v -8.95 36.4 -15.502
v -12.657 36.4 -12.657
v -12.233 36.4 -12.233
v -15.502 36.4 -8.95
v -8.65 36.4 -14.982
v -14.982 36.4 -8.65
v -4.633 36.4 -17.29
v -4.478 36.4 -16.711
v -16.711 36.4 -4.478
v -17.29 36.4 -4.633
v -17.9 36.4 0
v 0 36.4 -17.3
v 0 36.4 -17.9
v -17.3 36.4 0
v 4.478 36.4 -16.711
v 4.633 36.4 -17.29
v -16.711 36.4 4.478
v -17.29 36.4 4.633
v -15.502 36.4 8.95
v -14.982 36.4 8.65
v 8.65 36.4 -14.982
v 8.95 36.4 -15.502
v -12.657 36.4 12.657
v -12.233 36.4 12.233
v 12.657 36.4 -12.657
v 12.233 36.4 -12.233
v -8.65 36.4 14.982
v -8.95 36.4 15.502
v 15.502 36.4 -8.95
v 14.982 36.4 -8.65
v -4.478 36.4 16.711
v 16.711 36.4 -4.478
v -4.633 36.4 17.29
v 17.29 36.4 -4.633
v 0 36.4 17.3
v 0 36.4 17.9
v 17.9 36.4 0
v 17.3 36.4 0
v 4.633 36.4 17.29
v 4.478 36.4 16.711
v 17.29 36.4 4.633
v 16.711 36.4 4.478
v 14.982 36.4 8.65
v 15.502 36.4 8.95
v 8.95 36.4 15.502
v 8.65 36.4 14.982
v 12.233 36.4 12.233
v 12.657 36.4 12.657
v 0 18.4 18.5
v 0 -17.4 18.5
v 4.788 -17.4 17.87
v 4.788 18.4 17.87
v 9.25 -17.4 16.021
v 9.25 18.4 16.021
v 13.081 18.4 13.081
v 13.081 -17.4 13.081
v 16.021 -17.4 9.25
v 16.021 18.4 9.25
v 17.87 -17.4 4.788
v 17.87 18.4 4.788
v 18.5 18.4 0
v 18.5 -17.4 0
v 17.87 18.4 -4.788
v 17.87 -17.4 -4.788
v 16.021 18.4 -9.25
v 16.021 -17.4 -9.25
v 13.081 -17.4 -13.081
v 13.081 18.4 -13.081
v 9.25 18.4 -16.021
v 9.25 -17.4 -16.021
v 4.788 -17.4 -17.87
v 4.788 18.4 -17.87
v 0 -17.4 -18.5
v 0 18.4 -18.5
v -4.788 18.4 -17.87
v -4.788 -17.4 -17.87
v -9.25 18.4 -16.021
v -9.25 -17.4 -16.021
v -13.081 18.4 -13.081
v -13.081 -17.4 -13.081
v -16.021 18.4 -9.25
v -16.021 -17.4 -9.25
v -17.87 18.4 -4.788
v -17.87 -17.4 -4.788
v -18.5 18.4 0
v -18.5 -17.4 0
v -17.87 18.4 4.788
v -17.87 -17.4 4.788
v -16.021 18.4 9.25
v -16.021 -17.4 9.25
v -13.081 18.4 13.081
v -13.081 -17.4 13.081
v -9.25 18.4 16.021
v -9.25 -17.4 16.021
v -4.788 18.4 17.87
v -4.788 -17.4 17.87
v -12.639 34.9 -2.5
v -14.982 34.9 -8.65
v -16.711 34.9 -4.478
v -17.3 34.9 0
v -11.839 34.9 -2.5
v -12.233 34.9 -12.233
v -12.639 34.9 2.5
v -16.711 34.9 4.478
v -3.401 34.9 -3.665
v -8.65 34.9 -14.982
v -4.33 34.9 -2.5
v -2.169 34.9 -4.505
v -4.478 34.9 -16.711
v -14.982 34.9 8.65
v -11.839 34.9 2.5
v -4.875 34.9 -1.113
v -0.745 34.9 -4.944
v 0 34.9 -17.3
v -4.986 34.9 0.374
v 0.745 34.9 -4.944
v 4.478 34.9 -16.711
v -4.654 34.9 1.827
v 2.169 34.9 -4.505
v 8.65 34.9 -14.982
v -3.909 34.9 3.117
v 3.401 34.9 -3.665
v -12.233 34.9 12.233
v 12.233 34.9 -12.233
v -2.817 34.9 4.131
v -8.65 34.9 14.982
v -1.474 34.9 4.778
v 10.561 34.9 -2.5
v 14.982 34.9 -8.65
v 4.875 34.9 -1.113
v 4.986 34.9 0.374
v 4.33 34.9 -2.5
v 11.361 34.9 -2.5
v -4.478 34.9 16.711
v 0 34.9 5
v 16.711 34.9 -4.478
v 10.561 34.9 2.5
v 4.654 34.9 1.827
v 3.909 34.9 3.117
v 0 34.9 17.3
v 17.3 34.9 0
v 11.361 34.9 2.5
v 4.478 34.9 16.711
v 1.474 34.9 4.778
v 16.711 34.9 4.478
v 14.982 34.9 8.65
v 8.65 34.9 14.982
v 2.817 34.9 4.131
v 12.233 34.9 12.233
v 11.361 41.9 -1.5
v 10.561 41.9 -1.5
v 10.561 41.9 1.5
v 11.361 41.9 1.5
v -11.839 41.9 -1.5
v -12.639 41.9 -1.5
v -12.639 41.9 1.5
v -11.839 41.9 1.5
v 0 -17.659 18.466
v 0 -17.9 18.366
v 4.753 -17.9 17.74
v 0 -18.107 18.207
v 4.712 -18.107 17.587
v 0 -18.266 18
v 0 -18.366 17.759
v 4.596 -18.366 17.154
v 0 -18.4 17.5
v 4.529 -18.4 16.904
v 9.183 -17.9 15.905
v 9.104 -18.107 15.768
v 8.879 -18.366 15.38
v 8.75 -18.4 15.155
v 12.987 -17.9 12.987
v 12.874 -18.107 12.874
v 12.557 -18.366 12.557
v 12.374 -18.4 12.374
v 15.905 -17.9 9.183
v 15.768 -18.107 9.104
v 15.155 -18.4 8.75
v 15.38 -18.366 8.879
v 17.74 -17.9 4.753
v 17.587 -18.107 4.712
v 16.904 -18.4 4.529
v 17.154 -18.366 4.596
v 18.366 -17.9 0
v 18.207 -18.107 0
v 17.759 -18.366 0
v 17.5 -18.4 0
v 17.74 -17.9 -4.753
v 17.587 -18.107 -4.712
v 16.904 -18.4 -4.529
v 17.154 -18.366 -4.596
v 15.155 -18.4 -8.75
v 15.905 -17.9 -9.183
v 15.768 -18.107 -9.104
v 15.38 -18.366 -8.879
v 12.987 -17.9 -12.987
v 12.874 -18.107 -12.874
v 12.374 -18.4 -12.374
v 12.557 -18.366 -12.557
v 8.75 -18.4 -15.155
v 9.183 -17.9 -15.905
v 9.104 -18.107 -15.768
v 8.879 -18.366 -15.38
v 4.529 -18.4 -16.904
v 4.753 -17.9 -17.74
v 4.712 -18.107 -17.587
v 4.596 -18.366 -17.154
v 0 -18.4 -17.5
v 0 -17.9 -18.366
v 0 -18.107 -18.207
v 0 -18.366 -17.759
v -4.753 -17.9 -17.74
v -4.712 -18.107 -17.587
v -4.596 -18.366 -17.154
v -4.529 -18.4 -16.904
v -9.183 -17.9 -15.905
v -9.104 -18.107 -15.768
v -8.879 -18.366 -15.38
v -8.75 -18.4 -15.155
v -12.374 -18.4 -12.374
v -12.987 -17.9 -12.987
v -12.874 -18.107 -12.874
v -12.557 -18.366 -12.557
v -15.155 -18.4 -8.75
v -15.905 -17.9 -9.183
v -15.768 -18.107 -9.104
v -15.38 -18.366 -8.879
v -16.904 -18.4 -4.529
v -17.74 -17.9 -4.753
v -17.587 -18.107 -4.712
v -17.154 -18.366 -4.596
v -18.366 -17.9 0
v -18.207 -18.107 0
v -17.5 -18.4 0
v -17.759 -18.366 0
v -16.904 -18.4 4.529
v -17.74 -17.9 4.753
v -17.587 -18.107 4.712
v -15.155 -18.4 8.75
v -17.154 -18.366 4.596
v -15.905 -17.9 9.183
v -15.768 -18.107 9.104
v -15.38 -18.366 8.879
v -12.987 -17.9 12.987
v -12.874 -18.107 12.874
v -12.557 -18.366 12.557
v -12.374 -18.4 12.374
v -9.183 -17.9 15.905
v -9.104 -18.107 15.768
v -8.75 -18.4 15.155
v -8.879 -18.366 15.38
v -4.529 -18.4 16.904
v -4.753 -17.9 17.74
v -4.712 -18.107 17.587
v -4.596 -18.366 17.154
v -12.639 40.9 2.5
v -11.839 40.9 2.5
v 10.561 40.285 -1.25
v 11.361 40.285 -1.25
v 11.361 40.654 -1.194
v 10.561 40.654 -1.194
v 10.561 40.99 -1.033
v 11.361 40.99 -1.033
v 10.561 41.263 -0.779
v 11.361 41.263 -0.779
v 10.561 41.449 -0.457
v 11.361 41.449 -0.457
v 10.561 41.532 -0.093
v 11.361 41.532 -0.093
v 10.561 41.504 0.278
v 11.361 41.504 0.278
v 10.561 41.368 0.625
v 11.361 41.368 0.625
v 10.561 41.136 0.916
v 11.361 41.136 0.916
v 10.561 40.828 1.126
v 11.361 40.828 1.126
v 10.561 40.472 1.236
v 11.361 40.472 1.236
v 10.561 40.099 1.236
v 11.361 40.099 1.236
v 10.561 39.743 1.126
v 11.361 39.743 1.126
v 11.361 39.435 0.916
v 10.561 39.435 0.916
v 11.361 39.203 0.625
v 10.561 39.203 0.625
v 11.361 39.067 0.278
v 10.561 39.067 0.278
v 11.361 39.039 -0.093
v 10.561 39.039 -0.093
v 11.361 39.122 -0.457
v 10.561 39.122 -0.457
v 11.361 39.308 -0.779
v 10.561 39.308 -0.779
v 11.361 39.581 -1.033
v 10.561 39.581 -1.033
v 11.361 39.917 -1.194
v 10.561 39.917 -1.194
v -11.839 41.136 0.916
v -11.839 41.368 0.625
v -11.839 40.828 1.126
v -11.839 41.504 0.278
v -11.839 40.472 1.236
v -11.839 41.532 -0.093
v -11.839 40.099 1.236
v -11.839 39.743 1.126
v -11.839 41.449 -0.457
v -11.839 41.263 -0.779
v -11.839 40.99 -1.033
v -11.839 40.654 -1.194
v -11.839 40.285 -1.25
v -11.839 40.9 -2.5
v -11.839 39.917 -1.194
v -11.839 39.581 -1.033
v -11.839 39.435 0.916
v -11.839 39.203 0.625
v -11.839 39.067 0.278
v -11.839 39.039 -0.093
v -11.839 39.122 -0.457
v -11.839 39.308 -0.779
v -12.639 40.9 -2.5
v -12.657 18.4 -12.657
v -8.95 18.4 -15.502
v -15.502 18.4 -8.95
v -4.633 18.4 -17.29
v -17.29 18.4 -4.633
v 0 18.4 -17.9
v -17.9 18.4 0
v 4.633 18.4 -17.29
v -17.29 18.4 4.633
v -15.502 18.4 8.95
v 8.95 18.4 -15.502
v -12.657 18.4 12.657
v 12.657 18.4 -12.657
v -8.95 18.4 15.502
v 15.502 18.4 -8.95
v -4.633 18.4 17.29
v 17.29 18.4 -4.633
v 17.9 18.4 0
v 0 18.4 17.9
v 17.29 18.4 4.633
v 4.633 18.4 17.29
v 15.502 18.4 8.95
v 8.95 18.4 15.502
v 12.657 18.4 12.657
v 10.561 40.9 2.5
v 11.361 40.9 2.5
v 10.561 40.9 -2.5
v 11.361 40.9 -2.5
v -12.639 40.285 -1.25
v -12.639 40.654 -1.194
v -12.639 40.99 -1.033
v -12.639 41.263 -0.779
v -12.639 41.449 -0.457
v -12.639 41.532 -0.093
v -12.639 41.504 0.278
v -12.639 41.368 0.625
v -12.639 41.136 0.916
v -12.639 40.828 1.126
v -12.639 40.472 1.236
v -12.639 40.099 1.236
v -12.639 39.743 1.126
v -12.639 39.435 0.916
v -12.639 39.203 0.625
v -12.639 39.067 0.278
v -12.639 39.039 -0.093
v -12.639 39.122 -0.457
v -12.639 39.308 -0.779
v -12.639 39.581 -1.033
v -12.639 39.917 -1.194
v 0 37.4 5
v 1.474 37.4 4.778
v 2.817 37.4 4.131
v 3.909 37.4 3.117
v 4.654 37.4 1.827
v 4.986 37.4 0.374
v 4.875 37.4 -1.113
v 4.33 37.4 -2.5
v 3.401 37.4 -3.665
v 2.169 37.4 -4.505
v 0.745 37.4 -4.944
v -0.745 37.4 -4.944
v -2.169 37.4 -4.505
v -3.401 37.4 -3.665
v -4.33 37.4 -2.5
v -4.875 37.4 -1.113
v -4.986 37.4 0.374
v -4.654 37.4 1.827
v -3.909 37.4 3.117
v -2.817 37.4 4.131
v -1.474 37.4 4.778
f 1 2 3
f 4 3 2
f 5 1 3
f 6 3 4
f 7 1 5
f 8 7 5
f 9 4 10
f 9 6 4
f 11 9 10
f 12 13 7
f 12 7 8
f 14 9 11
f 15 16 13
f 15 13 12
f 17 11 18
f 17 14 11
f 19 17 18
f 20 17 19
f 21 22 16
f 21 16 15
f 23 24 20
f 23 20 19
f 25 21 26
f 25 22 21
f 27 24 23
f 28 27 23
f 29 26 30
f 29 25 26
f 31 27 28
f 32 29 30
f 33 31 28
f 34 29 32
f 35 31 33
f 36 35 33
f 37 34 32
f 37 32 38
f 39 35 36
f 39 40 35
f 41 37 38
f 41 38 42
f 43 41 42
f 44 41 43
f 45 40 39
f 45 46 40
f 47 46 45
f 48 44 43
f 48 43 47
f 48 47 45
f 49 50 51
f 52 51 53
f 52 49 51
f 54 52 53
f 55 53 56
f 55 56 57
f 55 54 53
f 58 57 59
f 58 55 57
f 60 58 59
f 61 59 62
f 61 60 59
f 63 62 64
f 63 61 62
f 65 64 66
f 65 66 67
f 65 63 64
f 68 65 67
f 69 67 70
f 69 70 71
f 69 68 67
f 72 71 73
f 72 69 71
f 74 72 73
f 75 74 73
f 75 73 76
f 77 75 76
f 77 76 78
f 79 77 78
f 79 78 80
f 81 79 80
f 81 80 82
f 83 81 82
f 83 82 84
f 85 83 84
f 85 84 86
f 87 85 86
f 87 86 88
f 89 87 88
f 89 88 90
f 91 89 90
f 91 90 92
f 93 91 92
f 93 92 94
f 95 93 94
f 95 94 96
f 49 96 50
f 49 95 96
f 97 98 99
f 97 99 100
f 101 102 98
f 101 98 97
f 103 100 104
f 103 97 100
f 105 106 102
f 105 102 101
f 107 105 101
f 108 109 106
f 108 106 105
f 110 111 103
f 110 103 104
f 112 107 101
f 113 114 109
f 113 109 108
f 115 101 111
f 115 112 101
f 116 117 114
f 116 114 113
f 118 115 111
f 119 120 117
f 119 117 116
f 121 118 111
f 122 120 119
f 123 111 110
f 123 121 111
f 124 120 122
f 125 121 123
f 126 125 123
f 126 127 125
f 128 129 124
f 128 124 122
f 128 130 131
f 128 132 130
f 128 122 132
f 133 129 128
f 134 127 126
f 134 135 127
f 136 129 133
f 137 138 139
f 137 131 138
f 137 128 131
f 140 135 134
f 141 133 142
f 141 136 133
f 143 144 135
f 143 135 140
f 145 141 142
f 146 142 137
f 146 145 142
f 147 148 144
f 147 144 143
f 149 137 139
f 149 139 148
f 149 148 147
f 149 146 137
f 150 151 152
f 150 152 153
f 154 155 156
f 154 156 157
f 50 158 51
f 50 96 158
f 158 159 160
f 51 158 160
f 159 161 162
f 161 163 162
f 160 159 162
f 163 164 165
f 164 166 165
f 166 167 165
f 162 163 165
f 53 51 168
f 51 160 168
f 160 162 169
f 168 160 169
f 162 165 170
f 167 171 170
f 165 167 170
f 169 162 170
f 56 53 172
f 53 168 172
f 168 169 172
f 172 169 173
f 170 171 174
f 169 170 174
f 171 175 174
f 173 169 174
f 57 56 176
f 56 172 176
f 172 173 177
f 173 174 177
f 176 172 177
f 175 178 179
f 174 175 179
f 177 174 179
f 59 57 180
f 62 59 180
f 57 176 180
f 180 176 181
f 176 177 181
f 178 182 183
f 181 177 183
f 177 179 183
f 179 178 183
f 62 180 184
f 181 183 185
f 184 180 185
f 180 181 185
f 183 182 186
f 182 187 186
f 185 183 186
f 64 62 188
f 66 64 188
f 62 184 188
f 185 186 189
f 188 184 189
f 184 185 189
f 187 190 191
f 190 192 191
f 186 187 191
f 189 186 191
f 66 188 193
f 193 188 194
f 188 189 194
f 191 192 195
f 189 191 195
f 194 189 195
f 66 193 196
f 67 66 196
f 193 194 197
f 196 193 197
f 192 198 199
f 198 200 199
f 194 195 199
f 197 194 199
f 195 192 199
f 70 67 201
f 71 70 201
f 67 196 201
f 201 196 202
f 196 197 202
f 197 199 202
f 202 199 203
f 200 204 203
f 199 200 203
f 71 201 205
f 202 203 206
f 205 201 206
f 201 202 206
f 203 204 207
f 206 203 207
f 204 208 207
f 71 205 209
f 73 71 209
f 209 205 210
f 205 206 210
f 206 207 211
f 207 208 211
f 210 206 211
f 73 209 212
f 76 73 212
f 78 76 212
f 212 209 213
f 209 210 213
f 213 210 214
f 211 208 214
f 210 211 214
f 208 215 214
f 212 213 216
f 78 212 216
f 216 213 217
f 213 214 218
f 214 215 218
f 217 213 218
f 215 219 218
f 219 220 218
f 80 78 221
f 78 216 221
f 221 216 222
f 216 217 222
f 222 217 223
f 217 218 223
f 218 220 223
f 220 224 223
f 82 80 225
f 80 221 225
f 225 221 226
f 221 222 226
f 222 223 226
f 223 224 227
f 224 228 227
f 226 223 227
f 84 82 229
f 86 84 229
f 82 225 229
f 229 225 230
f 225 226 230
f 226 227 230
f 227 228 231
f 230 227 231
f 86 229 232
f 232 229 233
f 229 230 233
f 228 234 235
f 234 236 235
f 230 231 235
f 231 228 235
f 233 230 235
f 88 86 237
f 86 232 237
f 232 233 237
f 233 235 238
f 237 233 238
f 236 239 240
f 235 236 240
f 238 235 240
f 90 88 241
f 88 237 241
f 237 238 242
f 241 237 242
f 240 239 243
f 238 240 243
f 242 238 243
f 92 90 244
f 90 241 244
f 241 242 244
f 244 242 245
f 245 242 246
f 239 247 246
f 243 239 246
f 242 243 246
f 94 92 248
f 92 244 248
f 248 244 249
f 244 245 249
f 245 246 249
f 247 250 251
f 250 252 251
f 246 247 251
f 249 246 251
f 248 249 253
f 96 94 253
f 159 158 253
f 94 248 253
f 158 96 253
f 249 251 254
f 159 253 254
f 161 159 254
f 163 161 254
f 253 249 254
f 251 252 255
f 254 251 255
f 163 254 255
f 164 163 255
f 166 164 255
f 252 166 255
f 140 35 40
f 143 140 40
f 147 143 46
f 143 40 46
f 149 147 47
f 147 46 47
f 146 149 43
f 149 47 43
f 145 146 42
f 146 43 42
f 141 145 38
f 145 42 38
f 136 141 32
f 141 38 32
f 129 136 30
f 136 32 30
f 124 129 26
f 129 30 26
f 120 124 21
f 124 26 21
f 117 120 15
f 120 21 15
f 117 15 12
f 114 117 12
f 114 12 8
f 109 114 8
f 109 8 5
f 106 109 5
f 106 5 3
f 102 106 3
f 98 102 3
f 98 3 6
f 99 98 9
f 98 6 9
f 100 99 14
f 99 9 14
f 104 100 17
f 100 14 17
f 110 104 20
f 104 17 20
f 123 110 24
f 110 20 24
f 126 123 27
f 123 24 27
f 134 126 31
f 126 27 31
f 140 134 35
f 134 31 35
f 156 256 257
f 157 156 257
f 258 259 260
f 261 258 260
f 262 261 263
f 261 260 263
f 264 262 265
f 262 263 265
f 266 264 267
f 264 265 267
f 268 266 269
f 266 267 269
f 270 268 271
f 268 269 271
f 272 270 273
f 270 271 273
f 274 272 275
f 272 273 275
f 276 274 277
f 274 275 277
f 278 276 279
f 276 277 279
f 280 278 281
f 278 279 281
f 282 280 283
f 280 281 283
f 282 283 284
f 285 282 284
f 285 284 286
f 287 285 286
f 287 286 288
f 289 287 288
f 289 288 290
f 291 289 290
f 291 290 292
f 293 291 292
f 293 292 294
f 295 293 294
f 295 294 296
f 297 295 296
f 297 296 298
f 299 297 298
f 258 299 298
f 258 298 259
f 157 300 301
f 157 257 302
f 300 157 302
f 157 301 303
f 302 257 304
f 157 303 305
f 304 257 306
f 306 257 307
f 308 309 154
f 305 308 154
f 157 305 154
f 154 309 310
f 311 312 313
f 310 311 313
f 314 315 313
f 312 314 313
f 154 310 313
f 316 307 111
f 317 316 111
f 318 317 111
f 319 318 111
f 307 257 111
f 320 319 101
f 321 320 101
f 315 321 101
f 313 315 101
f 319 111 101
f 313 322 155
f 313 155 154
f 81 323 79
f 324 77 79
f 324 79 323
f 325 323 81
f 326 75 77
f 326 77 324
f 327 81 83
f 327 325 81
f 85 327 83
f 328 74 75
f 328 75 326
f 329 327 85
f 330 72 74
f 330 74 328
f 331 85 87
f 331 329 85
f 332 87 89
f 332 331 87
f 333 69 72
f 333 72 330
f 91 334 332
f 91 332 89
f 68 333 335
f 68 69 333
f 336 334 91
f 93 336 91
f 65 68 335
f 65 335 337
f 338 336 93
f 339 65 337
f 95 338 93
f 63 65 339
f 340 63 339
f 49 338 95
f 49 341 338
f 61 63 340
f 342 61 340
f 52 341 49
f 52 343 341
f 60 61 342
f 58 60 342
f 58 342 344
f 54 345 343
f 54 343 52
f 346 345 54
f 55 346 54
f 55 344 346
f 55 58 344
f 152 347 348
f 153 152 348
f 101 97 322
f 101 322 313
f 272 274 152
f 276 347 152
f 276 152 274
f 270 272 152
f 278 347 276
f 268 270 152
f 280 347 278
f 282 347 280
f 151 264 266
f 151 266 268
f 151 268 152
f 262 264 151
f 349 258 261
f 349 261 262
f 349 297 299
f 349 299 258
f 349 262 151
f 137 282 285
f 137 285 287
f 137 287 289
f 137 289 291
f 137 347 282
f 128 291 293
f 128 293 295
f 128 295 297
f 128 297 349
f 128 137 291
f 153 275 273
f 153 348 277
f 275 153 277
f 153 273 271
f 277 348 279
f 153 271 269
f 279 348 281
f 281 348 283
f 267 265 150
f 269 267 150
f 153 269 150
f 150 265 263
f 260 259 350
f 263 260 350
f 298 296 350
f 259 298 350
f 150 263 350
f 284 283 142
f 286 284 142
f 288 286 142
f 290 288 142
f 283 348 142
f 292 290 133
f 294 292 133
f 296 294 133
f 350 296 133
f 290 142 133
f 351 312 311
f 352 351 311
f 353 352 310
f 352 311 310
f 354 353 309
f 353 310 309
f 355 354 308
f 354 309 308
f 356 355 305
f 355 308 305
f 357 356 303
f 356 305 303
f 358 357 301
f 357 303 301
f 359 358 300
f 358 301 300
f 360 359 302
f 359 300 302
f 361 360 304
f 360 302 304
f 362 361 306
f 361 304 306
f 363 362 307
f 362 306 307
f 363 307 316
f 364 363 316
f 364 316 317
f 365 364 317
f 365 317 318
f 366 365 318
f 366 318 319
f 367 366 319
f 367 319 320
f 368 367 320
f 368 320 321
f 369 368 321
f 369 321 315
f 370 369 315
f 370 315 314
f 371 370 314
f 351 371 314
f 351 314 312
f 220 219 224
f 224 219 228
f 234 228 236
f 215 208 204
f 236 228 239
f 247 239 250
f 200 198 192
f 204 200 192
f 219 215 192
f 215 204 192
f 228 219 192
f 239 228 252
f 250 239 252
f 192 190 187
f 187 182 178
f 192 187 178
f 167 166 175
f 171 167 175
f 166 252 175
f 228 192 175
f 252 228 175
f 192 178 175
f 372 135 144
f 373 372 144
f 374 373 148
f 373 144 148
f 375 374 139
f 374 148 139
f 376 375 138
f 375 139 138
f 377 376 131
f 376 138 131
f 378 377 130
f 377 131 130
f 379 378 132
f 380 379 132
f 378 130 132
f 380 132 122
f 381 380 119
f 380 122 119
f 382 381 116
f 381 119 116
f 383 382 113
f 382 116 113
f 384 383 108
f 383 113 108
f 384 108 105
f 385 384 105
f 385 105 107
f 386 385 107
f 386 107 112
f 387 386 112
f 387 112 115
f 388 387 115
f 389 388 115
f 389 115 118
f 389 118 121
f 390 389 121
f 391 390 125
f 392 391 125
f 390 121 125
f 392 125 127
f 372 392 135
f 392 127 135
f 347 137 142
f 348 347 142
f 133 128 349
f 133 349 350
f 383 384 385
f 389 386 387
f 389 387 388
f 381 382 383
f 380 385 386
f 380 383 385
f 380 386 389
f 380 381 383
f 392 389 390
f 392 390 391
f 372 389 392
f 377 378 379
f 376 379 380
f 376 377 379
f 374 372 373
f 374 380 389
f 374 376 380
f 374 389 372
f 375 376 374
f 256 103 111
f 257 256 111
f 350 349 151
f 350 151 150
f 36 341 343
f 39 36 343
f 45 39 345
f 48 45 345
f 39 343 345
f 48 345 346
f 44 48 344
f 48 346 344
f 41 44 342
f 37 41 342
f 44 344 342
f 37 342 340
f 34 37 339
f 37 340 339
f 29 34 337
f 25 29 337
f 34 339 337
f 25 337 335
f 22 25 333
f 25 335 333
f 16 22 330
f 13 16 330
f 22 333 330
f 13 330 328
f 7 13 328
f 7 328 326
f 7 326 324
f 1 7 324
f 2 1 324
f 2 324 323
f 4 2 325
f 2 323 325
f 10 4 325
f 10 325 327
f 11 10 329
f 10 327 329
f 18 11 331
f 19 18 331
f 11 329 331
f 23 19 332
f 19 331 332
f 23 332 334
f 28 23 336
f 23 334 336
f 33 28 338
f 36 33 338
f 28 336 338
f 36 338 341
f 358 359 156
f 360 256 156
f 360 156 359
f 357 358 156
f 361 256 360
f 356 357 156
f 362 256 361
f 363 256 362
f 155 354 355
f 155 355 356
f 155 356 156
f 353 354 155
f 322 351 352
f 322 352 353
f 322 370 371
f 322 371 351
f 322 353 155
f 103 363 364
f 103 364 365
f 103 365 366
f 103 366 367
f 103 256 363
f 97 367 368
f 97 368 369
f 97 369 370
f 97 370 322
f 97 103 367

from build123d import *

# Parameters (mm, degrees)
CROQUIS1_R                = 18.5
SALIENTE_EXTRUIR1_DEPTH   = 18.4
CROQUIS2_R                = 17.9
SALIENTE_EXTRUIR2_DEPTH   = 18
CROQUIS3_R                = 17.3
CORTAR_EXTRUIR1_DEPTH     = 1.5
CROQUIS4_R                = 5
SALIENTE_EXTRUIR3_DEPTH   = 2.5
CROQUIS5_W                = 0.8
CROQUIS5_H                = 5
SALIENTE_EXTRUIR4_DEPTH   = 7
CHAFL_N1_SIZE             = 1
CHAFL_N2_SIZE             = 1
CROQUIS6_R                = 1.25
CORTAR_EXTRUIR2_DEPTH     = 7
MATRIZL1_COUNT            = 2
MATRIZL1_PITCH            = 23.2
CHAFL_N1_OF_MATRIZL1_SIZE = 1
CHAFL_N2_OF_MATRIZL1_SIZE = 1
REDONDEO1_R               = 1


with BuildPart() as part:
    # Croquis1 → Saliente-Extruir1 (new, symmetric)
    with BuildSketch(Plane(origin=(0, 0, 0), x_dir=(1, 0, 0), z_dir=(0, 1, 0))):
        with Locations(Location((0, 0, 0), (0, 0, 270))):
            Circle(CROQUIS1_R)
    extrude(amount=SALIENTE_EXTRUIR1_DEPTH, both=True)

    # Croquis2 → Saliente-Extruir2 (add)
    with BuildSketch(Plane(origin=(0, 18.4, 0), x_dir=(1, 0, 0), z_dir=(0, 1, 0))):
        with Locations(Location((0, 0, 0), (0, 0, 270))):
            Circle(CROQUIS2_R)
    extrude(amount=SALIENTE_EXTRUIR2_DEPTH)

    # Croquis3 → Cortar-Extruir1 (cut)
    with BuildSketch(Plane(origin=(0, 36.4, 0), x_dir=(1, 0, 0), z_dir=(0, 1, 0))):
        with Locations(Location((0, 0, 0), (0, 0, 270))):
            Circle(CROQUIS3_R)
    extrude(amount=-CORTAR_EXTRUIR1_DEPTH, mode=Mode.SUBTRACT)

    # Croquis4 → Saliente-Extruir3 (add)
    with BuildSketch(Plane(origin=(0, 34.9, 0), x_dir=(1, 0, 0), z_dir=(0, 1, 0))):
        with Locations(Location((0, 0, 0), (0, 0, 270))):
            Circle(CROQUIS4_R)
    extrude(amount=SALIENTE_EXTRUIR3_DEPTH)

    # Croquis5 → Saliente-Extruir4 (add)
    with BuildSketch(Plane(origin=(0, 34.9, 0), x_dir=(1, 0, 0), z_dir=(0, 1, 0))):
        with Locations((-12.23891887, 0)):
            Rectangle(CROQUIS5_W, CROQUIS5_H)
    saliente_extruir4 = extrude(amount=SALIENTE_EXTRUIR4_DEPTH)

    # Chaflán1
    chafl_n1_edges = [part.edges().sort_by_distance(p)[0] for p in [
        (-12.23891887, 41.9, 2.5),
    ]]
    chamfer(chafl_n1_edges, length=CHAFL_N1_SIZE)

    # Chaflán2
    chafl_n2_edges = [part.edges().sort_by_distance(p)[0] for p in [
        (-12.23891887, 41.9, -2.5),
    ]]
    chamfer(chafl_n2_edges, length=CHAFL_N2_SIZE)

    # Croquis6 → Cortar-Extruir2 (cut)
    with BuildSketch(Plane(origin=(-11.83891887, 0, 0), x_dir=(0, 0, -1), z_dir=(1, 0, 0))):
        with Locations((0, 40.285474099)):
            Circle(CROQUIS6_R)
    cortar_extruir2 = extrude(amount=-CORTAR_EXTRUIR2_DEPTH, mode=Mode.SUBTRACT)

    # MatrizL1: Saliente-Extruir4, Cortar-Extruir2 ×2
    with Locations(*[(i * MATRIZL1_PITCH, 0, 0) for i in range(1, MATRIZL1_COUNT)]):
        add(saliente_extruir4)
        add(cortar_extruir2, mode=Mode.SUBTRACT)

    # Chaflán1 of MatrizL1
    chafl_n1_of_matrizl1_edges = [part.edges().sort_by_distance(p)[0] for p in [
        (10.96108113, 41.9, 2.5),
    ]]
    chamfer(chafl_n1_of_matrizl1_edges, length=CHAFL_N1_OF_MATRIZL1_SIZE)

    # Chaflán2 of MatrizL1
    chafl_n2_of_matrizl1_edges = [part.edges().sort_by_distance(p)[0] for p in [
        (10.96108113, 41.9, -2.5),
    ]]
    chamfer(chafl_n2_of_matrizl1_edges, length=CHAFL_N2_OF_MATRIZL1_SIZE)

    # Redondeo1
    redondeo1_edges = [part.edges().sort_by_distance(p)[0] for p in [
        (0, -18.4, -18.5),
    ]]
    fillet(redondeo1_edges, radius=REDONDEO1_R)


solid = part.part
